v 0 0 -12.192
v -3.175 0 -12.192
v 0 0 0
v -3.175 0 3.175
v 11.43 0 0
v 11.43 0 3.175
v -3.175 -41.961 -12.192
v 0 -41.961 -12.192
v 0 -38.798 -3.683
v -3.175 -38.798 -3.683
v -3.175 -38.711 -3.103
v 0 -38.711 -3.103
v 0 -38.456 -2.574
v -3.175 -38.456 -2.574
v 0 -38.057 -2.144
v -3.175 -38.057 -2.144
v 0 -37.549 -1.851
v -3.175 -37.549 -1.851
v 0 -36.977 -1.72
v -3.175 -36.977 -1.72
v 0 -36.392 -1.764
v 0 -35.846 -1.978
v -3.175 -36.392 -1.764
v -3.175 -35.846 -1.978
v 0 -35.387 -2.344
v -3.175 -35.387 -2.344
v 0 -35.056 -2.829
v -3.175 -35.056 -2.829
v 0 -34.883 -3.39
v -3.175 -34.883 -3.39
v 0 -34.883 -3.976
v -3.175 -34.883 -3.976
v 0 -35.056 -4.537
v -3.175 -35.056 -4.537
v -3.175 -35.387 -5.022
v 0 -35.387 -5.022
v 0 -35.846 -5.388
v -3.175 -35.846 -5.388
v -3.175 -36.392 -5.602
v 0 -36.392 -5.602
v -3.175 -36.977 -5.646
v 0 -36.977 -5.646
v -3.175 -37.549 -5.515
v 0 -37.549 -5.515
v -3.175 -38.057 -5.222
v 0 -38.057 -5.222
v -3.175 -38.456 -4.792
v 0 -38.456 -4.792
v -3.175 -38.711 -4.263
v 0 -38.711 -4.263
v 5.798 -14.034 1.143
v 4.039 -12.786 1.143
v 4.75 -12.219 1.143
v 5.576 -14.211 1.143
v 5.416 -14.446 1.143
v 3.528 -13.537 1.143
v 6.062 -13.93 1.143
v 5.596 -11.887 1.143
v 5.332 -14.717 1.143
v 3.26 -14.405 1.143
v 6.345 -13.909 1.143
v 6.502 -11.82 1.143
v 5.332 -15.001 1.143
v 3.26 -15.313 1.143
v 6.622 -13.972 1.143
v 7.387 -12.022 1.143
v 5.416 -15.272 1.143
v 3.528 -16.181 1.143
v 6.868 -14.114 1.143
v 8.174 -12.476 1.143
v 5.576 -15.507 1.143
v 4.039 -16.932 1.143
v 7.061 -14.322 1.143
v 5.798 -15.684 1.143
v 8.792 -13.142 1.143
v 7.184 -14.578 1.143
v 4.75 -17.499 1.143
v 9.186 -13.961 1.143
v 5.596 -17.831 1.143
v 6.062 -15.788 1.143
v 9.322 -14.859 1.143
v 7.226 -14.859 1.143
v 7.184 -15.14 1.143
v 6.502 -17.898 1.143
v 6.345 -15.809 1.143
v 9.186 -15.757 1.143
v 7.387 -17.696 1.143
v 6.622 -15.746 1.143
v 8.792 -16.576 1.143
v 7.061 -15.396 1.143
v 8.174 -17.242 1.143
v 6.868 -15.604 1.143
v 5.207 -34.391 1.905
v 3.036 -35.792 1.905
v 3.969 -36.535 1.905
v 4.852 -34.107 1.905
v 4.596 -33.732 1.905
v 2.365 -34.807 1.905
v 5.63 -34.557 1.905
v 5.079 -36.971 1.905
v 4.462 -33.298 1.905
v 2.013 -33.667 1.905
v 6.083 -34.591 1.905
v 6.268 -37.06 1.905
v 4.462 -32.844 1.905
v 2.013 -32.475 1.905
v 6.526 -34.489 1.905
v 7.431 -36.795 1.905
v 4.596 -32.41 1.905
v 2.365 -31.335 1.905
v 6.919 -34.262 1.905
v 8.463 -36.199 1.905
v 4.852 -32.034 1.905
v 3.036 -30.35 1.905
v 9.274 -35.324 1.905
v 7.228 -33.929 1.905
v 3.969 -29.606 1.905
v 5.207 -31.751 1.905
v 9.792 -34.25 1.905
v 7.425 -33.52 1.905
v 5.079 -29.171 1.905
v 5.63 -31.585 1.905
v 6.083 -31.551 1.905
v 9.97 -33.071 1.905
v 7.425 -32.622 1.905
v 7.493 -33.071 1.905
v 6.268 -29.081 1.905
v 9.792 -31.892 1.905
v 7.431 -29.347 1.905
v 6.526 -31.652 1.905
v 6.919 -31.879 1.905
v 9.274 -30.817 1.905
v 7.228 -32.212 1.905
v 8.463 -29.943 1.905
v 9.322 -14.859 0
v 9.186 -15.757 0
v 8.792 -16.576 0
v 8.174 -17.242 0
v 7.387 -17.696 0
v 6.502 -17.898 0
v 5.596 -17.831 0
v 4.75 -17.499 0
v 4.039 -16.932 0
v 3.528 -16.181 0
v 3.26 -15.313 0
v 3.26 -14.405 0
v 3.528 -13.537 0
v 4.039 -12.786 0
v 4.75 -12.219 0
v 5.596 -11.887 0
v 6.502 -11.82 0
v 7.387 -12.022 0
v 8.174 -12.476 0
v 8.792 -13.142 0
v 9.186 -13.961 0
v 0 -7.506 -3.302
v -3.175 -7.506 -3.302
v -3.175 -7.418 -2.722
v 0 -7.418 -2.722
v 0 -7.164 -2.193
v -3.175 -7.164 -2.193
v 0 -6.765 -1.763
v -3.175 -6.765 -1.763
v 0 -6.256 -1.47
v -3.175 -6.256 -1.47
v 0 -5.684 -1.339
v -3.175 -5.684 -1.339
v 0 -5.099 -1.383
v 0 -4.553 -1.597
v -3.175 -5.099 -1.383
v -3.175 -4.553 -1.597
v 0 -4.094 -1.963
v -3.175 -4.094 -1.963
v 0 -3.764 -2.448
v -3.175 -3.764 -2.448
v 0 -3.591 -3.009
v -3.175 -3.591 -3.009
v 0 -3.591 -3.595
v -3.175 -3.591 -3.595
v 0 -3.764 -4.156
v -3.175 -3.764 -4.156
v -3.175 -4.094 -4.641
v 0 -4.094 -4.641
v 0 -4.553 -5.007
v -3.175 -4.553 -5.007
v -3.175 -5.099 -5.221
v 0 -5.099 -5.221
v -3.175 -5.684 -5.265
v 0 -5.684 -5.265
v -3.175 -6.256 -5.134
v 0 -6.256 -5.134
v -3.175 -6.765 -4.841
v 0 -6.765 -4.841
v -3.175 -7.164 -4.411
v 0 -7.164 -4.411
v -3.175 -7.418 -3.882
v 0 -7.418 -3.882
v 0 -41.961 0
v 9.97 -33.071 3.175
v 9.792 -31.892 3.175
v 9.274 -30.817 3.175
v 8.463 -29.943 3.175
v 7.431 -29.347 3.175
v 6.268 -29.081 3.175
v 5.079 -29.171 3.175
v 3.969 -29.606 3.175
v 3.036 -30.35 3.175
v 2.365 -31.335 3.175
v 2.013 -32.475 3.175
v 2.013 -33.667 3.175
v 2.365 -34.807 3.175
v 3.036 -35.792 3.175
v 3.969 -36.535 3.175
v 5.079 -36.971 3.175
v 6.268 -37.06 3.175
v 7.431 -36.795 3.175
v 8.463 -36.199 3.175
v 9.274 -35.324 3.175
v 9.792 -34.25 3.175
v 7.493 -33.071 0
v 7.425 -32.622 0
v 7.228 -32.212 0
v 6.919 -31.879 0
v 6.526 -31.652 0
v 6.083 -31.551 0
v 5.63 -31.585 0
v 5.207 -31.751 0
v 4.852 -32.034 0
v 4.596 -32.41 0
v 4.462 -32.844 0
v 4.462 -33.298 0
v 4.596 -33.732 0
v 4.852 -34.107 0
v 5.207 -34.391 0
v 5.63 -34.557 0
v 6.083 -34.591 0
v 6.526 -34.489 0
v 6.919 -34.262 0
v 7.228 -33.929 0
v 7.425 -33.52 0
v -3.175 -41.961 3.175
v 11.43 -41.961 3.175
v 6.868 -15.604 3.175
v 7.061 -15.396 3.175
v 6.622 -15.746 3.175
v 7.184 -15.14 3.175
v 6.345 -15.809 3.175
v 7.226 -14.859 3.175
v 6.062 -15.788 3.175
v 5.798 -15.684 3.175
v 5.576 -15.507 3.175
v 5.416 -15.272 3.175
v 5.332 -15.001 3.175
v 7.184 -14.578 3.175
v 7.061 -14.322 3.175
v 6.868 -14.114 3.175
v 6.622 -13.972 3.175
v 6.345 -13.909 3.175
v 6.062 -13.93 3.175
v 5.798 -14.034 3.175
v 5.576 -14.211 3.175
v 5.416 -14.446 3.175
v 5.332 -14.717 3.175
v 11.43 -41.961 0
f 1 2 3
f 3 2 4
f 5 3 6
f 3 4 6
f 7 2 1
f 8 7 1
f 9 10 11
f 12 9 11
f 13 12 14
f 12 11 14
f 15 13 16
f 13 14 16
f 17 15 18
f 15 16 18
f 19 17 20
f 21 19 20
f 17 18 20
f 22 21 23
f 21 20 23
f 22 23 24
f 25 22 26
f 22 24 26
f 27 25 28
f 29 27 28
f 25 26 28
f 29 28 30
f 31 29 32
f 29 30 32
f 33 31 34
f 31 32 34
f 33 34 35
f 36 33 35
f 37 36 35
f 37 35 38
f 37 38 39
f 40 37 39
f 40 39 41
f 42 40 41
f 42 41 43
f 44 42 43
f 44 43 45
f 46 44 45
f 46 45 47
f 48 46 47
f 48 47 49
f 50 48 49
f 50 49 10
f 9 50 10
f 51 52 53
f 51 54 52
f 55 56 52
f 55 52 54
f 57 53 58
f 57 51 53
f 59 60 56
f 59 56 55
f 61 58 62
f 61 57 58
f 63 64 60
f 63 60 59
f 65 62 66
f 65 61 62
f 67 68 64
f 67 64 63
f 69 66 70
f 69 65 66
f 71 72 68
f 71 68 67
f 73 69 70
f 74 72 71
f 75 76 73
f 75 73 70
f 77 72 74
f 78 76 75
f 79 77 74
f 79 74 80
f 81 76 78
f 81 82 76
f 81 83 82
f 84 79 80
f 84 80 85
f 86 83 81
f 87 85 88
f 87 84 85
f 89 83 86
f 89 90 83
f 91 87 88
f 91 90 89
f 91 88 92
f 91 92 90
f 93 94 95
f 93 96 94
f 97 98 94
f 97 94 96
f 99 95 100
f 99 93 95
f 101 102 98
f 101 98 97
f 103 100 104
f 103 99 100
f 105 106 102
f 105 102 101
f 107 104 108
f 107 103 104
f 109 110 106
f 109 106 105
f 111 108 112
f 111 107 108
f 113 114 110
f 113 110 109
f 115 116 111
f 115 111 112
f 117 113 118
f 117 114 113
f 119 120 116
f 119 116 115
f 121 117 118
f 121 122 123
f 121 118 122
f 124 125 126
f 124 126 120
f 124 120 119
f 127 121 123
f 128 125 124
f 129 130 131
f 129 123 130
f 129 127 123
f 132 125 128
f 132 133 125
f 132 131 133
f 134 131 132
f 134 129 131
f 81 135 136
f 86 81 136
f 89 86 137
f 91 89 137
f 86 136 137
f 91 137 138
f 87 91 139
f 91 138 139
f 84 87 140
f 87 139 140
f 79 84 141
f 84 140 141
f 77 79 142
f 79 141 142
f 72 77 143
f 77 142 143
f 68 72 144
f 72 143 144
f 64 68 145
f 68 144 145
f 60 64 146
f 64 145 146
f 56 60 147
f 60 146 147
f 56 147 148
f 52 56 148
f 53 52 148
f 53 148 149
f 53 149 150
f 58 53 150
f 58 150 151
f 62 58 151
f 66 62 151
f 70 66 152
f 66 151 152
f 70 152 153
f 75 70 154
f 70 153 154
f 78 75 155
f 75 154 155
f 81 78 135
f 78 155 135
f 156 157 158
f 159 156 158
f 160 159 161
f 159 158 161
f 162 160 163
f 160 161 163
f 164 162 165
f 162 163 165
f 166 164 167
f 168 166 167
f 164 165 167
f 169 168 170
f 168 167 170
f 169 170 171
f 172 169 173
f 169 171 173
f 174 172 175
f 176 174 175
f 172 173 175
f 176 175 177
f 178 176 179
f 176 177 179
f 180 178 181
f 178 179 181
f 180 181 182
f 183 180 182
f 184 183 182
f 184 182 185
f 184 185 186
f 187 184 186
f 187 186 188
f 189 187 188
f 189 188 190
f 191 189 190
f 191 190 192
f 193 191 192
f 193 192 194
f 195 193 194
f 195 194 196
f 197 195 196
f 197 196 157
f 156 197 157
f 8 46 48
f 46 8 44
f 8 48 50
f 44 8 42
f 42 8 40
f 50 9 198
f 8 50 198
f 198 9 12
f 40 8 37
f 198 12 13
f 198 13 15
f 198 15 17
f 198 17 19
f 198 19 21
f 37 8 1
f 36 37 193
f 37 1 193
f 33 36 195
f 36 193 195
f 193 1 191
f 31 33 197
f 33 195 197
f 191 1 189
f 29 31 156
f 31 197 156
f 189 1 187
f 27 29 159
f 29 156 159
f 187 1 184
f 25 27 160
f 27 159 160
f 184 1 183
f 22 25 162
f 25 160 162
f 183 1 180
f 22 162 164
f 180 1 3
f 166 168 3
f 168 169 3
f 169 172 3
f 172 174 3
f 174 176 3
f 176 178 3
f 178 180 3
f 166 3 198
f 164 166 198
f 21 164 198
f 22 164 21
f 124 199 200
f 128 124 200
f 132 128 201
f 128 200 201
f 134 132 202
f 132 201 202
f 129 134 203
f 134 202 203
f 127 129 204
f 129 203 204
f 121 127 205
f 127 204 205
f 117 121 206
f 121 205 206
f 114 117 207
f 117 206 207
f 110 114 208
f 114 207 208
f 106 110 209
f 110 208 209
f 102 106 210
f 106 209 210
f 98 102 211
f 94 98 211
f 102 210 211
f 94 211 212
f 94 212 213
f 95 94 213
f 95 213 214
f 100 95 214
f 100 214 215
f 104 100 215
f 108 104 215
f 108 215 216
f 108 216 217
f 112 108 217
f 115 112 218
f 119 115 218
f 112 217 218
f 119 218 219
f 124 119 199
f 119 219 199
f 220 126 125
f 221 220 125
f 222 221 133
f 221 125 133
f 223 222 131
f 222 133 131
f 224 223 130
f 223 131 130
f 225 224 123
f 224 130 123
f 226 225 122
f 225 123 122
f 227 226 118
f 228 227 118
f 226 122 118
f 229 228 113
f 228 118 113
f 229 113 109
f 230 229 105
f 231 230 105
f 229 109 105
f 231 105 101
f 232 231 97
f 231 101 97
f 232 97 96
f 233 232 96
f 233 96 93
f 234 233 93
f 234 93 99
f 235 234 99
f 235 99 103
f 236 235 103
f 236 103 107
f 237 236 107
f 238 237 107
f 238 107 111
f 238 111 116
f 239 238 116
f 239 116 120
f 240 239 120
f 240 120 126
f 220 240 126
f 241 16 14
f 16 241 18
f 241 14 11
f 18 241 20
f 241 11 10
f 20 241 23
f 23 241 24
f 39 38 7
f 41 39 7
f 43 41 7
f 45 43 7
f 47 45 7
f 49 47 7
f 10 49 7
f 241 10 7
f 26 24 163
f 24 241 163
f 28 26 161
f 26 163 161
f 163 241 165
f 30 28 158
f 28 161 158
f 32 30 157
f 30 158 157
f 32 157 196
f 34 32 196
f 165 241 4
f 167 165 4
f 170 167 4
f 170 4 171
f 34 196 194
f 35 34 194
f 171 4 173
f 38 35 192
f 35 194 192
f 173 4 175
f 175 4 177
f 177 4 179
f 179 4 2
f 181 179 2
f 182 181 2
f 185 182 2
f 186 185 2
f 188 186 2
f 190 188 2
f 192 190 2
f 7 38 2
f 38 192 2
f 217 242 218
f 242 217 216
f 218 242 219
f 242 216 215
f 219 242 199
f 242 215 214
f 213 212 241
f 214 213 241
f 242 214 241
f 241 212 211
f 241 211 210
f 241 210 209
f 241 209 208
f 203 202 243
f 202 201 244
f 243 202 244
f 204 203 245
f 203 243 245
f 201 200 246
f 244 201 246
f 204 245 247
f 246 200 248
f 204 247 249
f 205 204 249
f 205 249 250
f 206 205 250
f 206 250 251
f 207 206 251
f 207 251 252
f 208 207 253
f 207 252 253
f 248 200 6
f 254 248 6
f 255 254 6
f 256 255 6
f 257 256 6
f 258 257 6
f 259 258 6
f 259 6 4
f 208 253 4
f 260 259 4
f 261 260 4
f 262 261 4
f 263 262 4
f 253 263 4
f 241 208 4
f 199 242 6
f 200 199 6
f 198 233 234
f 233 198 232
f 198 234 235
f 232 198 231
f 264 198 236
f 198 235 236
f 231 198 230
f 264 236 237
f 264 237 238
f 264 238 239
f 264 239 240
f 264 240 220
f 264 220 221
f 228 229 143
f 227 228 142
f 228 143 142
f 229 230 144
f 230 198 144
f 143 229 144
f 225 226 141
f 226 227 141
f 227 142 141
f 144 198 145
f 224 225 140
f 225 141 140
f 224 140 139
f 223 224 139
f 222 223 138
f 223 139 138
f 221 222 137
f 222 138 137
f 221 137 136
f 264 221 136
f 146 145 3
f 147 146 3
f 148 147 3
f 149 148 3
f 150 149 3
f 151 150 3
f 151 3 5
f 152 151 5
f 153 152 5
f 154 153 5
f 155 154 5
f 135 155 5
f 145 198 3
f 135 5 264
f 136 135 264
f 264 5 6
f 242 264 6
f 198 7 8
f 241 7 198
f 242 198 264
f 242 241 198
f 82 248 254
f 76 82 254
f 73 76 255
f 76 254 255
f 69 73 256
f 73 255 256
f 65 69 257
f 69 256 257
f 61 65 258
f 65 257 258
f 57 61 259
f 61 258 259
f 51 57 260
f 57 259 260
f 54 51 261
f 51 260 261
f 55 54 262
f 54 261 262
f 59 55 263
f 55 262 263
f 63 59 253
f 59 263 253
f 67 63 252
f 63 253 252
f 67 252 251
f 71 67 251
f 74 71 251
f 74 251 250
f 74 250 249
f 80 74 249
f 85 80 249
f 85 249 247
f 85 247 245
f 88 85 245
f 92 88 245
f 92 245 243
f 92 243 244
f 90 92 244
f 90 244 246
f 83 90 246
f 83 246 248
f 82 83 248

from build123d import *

# Parameters (mm, degrees)
F1_DEPTH  = 41.9608
F2_R      = 1.9685
F3_DEPTH  = 14.606
F4_R      = 0.9525
F5_DEPTH  = 15.368
F6_R      = 3.048
F7_DEPTH  = 1.143
F8_R      = 1.524
F9_DEPTH  = 15.368
F10_R     = 4.0005
F11_DEPTH = 1.27


with BuildPart() as f1:
    # F0 (on Front) → F1 (new body)
    with BuildSketch(Plane.XZ):
        Polygon((0, -12.192), (0, 0), (11.43, 0), (11.43, 3.175), (-3.175, 3.175), (-3.175, -12.192), align=None)
    extrude(amount=F1_DEPTH)

    # F2 (on face) → F3 (cut, through all)
    with BuildSketch(Plane(origin=(-3.175, 0, 0), x_dir=(0, -1, 0), z_dir=(-1, 0, 0))):
        with Locations((5.5372, -3.302)):
            Circle(F2_R)
        with Locations((36.83, -3.683)):
            Circle(F2_R)
    extrude(amount=-F3_DEPTH, mode=Mode.SUBTRACT)

    # F4 (on face) → F5 (cut, through all)
    with BuildSketch(Plane.XY.offset(3.175)):
        with Locations((6.2738, -14.859)):
            Circle(F4_R)
    extrude(amount=-F5_DEPTH, mode=Mode.SUBTRACT)

    # F6 (on face) → F7 (cut)
    with BuildSketch(Plane(origin=(0, 0, 0), x_dir=(1, 0, 0), z_dir=(0, 0, -1))):
        with Locations((6.2738, 14.859)):
            Circle(F6_R)
    extrude(amount=-F7_DEPTH, mode=Mode.SUBTRACT)

    # F8 (on face) → F9 (cut, through all)
    with BuildSketch(Plane.XY.offset(3.175)):
        with Locations((5.969, -33.0708)):
            Circle(F8_R)
    extrude(amount=-F9_DEPTH, mode=Mode.SUBTRACT)

    # F10 (on face) → F11 (cut)
    with BuildSketch(Plane.XY.offset(3.175)):
        with Locations((5.969, -33.0708)):
            Circle(F10_R)
    extrude(amount=-F11_DEPTH, mode=Mode.SUBTRACT)


solid = f1.part
